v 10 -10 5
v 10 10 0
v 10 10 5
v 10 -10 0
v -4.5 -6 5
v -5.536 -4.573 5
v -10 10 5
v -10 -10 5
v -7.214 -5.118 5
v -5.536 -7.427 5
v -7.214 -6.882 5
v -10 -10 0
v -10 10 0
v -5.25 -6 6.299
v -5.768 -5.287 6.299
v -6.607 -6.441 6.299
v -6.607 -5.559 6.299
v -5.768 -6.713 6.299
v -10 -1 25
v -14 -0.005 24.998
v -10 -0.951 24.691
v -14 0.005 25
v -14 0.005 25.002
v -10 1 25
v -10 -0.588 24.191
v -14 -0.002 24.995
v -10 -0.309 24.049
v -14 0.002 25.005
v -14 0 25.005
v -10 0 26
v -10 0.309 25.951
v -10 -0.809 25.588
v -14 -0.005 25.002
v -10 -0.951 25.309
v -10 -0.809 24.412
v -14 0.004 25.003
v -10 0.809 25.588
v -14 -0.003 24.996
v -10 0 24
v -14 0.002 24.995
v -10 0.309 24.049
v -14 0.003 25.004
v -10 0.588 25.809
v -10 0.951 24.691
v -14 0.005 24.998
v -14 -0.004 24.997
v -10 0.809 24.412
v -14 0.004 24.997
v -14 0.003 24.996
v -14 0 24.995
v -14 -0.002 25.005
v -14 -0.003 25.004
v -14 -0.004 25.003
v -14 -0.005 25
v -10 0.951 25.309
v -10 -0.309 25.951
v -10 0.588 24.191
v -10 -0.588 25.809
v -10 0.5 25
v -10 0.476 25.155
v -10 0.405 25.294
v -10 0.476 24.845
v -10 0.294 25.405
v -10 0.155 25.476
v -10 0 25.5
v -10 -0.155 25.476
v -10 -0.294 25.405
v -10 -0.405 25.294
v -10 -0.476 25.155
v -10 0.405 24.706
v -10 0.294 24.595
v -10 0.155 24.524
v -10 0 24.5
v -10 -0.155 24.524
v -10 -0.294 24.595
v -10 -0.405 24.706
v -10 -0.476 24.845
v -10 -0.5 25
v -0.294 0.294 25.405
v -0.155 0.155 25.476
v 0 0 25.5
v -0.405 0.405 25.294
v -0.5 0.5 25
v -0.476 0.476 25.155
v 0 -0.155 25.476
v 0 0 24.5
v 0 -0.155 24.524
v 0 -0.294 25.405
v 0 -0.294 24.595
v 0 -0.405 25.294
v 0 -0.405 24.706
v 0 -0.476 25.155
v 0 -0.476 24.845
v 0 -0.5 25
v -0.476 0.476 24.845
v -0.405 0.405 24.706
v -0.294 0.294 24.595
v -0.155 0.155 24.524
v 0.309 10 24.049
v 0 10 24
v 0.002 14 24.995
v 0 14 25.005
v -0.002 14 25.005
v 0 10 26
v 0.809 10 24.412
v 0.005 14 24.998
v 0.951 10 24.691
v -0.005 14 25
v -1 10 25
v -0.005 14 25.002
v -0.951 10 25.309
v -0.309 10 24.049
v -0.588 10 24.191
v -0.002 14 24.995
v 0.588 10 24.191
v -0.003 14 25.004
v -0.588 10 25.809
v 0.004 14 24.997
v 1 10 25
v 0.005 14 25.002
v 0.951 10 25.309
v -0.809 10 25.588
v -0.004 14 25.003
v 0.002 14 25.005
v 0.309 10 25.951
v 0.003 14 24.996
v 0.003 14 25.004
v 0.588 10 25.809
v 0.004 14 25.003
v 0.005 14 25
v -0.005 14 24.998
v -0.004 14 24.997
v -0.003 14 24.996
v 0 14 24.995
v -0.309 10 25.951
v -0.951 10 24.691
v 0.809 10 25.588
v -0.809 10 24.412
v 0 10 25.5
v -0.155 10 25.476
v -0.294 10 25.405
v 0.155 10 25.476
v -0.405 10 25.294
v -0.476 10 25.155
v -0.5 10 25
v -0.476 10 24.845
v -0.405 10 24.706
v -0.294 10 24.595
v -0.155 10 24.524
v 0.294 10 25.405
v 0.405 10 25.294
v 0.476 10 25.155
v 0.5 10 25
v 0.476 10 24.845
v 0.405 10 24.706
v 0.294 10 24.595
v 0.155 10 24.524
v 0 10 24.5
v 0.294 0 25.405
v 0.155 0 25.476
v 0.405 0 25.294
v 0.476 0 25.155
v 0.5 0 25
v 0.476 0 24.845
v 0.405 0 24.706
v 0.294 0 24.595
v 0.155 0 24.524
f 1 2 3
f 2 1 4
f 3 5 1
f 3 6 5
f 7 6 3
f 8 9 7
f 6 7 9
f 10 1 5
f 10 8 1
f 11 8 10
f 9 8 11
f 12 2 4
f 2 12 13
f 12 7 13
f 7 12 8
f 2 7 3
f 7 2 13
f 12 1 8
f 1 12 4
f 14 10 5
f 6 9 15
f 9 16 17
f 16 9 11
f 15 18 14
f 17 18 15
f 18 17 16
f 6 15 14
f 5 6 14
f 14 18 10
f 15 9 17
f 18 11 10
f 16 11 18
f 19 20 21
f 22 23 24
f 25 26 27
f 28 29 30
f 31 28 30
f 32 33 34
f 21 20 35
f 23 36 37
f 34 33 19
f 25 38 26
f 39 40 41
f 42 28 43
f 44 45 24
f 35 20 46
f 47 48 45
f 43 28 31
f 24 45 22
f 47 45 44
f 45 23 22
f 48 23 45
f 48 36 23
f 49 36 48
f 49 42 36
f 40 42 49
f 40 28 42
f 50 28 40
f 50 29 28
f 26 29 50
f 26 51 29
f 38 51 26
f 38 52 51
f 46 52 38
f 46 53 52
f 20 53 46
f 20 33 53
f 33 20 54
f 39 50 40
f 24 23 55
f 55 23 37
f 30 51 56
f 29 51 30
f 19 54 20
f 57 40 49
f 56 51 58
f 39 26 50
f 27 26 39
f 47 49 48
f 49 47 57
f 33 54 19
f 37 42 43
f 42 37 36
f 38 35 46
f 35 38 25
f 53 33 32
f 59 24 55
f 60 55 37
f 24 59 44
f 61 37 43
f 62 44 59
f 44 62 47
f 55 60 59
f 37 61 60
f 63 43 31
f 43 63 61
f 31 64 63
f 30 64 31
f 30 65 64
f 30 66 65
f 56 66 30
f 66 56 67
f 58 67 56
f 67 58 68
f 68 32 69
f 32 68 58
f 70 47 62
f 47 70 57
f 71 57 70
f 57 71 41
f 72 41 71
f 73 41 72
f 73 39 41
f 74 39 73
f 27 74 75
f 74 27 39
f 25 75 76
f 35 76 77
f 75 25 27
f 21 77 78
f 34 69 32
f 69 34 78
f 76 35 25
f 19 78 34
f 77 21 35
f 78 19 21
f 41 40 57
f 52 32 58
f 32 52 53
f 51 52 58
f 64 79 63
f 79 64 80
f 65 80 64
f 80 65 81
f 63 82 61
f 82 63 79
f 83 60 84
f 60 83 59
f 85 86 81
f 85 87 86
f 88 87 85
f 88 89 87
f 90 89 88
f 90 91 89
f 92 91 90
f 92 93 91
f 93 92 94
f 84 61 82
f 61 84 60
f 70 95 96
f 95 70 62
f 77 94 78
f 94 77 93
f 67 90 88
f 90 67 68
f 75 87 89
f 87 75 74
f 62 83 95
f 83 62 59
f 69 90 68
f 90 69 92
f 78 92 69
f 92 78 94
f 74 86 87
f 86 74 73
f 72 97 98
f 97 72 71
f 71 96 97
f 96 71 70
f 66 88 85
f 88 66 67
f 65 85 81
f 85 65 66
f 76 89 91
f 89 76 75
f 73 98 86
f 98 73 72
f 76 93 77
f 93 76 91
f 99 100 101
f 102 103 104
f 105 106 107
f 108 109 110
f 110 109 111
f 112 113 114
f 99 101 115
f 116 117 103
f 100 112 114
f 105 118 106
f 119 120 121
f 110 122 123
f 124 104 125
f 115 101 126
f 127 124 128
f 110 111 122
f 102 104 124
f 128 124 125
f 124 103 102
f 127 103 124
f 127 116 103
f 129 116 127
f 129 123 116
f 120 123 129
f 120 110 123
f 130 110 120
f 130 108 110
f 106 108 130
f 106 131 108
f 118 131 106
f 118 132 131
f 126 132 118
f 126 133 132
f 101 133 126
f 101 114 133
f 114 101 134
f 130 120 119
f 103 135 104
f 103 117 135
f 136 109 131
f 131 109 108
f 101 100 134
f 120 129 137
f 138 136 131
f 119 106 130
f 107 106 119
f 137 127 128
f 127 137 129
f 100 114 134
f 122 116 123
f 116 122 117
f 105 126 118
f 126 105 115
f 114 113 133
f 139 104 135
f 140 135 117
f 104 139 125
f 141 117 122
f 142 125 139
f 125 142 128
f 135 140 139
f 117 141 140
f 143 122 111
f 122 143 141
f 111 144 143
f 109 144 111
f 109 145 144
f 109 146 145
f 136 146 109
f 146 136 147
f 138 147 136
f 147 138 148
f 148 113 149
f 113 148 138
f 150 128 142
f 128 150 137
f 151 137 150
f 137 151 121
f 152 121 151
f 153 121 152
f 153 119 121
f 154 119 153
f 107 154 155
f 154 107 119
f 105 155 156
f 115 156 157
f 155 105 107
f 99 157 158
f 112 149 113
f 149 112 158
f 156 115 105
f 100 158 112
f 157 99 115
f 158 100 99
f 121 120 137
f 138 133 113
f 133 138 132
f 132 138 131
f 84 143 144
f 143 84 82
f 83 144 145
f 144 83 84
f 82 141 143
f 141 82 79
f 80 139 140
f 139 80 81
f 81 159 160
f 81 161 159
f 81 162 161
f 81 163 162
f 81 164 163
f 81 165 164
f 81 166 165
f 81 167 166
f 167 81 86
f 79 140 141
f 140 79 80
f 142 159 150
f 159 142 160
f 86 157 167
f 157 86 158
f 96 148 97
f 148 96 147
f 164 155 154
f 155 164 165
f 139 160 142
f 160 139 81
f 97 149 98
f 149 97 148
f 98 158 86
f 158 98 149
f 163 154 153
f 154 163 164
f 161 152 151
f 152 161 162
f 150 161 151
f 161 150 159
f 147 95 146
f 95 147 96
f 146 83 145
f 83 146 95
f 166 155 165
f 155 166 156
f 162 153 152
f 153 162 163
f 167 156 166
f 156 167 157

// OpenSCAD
// file: axes.scad
module arrow(){
   body_h = 10;
   d = 1;
   arrow_base = 2;
   arrow_head_length = 4;
   
   translate([0,0,body_h]){
   cylinder ( d1 = arrow_base, d2 = 0.01, h =arrow_head_length, $fn = 20);
   }
   cylinder( d= 1, h = body_h,$fn = 20);
}

module rotation_arrow_rhs(){
rotate_extrude(angle = 120){
   translate([4,0,0]){
      circle ( d= 1, $fn = 20);
   }
}
rotate([0,0,120]){ 

rotate([90,0,0]){
      translate([4,0,-2]){
      cylinder ( d1 = 0.01, d2 = 1.75, h =2.5, $fn = 20);
   }
}
}
}
module rotation_arrow_lhs(){
   mirror([0,1,0]){
      rotation_arrow_rhs();
   }
}




module arrow_n_rotation_arrow_rhs(){
   arrow();
translate([0,0,9]){
rotation_arrow_rhs();
}
}

module arrow_n_rotation_arrow_lhs(){
   arrow();
translate([0,0,9]){
rotation_arrow_lhs();
}
}

//arrow();
module RHR_axes(){
   color("red"){
      translate([15,-2,-2]){
         rotate([0,-90,0]){
            text("X", size = 4);
         }
      }
      rotate([0,90,0]){
         children(0);
      }
   }  
   color("green"){
      translate([-2,15,-2]){
         rotate([90,0,0]){
            text("Y", size = 4);
         }
      }
      rotate([-90,0,0]){
       children(1);
      }
   }   
   
   color("blue"){
   translate([-2,-2,15]){
       rotate([0,0,0]){
          text("Z", size = 4);
       }
   }
   rotate([0,0,0]){
      children(2);
      }
   }   
   
}


RHR_axes(){
   arrow_n_rotation_arrow_rhs(); 
   arrow_n_rotation_arrow_rhs();
   arrow_n_rotation_arrow_rhs();
}




//RHR_axes();
// main file
use <axes.scad>



module arrow_axes(){
   RHR_axes(){arrow();arrow(); arrow();}
}

module ic(){
   translate([-10,-10,0]){
    
   cube([20,20,5]);

       
   translate([4,4,5]){
       color("black"){
      sphere( d = 3);
   }
         }
}
}


ic();
translate([0,0,25]){
rotate([0,180,0]){
arrow_axes();
}
}
translate([-10,15]){
text(" Ardupilot HMC5883");
}
